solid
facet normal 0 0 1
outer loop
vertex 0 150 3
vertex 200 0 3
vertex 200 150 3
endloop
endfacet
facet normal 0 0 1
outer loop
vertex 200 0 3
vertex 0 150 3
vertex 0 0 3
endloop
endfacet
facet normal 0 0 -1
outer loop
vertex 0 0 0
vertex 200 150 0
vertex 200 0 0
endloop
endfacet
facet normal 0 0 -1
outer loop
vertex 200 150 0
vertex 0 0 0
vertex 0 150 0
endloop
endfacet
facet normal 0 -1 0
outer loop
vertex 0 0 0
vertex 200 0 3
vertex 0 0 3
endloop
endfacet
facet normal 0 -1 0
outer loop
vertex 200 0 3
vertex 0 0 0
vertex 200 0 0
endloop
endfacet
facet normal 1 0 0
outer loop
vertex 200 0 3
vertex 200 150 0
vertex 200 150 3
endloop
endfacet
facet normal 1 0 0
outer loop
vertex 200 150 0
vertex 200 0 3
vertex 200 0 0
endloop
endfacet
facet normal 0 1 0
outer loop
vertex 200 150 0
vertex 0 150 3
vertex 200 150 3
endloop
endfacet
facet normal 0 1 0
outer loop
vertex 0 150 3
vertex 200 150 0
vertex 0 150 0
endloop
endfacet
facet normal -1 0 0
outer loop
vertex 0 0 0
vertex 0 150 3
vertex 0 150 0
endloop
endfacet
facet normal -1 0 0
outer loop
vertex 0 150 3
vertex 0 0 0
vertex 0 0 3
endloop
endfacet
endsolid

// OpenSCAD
$fn = 64;

length = 200;
width  = 150;
thickness = 3;

cube([length, width, thickness], center=false);
